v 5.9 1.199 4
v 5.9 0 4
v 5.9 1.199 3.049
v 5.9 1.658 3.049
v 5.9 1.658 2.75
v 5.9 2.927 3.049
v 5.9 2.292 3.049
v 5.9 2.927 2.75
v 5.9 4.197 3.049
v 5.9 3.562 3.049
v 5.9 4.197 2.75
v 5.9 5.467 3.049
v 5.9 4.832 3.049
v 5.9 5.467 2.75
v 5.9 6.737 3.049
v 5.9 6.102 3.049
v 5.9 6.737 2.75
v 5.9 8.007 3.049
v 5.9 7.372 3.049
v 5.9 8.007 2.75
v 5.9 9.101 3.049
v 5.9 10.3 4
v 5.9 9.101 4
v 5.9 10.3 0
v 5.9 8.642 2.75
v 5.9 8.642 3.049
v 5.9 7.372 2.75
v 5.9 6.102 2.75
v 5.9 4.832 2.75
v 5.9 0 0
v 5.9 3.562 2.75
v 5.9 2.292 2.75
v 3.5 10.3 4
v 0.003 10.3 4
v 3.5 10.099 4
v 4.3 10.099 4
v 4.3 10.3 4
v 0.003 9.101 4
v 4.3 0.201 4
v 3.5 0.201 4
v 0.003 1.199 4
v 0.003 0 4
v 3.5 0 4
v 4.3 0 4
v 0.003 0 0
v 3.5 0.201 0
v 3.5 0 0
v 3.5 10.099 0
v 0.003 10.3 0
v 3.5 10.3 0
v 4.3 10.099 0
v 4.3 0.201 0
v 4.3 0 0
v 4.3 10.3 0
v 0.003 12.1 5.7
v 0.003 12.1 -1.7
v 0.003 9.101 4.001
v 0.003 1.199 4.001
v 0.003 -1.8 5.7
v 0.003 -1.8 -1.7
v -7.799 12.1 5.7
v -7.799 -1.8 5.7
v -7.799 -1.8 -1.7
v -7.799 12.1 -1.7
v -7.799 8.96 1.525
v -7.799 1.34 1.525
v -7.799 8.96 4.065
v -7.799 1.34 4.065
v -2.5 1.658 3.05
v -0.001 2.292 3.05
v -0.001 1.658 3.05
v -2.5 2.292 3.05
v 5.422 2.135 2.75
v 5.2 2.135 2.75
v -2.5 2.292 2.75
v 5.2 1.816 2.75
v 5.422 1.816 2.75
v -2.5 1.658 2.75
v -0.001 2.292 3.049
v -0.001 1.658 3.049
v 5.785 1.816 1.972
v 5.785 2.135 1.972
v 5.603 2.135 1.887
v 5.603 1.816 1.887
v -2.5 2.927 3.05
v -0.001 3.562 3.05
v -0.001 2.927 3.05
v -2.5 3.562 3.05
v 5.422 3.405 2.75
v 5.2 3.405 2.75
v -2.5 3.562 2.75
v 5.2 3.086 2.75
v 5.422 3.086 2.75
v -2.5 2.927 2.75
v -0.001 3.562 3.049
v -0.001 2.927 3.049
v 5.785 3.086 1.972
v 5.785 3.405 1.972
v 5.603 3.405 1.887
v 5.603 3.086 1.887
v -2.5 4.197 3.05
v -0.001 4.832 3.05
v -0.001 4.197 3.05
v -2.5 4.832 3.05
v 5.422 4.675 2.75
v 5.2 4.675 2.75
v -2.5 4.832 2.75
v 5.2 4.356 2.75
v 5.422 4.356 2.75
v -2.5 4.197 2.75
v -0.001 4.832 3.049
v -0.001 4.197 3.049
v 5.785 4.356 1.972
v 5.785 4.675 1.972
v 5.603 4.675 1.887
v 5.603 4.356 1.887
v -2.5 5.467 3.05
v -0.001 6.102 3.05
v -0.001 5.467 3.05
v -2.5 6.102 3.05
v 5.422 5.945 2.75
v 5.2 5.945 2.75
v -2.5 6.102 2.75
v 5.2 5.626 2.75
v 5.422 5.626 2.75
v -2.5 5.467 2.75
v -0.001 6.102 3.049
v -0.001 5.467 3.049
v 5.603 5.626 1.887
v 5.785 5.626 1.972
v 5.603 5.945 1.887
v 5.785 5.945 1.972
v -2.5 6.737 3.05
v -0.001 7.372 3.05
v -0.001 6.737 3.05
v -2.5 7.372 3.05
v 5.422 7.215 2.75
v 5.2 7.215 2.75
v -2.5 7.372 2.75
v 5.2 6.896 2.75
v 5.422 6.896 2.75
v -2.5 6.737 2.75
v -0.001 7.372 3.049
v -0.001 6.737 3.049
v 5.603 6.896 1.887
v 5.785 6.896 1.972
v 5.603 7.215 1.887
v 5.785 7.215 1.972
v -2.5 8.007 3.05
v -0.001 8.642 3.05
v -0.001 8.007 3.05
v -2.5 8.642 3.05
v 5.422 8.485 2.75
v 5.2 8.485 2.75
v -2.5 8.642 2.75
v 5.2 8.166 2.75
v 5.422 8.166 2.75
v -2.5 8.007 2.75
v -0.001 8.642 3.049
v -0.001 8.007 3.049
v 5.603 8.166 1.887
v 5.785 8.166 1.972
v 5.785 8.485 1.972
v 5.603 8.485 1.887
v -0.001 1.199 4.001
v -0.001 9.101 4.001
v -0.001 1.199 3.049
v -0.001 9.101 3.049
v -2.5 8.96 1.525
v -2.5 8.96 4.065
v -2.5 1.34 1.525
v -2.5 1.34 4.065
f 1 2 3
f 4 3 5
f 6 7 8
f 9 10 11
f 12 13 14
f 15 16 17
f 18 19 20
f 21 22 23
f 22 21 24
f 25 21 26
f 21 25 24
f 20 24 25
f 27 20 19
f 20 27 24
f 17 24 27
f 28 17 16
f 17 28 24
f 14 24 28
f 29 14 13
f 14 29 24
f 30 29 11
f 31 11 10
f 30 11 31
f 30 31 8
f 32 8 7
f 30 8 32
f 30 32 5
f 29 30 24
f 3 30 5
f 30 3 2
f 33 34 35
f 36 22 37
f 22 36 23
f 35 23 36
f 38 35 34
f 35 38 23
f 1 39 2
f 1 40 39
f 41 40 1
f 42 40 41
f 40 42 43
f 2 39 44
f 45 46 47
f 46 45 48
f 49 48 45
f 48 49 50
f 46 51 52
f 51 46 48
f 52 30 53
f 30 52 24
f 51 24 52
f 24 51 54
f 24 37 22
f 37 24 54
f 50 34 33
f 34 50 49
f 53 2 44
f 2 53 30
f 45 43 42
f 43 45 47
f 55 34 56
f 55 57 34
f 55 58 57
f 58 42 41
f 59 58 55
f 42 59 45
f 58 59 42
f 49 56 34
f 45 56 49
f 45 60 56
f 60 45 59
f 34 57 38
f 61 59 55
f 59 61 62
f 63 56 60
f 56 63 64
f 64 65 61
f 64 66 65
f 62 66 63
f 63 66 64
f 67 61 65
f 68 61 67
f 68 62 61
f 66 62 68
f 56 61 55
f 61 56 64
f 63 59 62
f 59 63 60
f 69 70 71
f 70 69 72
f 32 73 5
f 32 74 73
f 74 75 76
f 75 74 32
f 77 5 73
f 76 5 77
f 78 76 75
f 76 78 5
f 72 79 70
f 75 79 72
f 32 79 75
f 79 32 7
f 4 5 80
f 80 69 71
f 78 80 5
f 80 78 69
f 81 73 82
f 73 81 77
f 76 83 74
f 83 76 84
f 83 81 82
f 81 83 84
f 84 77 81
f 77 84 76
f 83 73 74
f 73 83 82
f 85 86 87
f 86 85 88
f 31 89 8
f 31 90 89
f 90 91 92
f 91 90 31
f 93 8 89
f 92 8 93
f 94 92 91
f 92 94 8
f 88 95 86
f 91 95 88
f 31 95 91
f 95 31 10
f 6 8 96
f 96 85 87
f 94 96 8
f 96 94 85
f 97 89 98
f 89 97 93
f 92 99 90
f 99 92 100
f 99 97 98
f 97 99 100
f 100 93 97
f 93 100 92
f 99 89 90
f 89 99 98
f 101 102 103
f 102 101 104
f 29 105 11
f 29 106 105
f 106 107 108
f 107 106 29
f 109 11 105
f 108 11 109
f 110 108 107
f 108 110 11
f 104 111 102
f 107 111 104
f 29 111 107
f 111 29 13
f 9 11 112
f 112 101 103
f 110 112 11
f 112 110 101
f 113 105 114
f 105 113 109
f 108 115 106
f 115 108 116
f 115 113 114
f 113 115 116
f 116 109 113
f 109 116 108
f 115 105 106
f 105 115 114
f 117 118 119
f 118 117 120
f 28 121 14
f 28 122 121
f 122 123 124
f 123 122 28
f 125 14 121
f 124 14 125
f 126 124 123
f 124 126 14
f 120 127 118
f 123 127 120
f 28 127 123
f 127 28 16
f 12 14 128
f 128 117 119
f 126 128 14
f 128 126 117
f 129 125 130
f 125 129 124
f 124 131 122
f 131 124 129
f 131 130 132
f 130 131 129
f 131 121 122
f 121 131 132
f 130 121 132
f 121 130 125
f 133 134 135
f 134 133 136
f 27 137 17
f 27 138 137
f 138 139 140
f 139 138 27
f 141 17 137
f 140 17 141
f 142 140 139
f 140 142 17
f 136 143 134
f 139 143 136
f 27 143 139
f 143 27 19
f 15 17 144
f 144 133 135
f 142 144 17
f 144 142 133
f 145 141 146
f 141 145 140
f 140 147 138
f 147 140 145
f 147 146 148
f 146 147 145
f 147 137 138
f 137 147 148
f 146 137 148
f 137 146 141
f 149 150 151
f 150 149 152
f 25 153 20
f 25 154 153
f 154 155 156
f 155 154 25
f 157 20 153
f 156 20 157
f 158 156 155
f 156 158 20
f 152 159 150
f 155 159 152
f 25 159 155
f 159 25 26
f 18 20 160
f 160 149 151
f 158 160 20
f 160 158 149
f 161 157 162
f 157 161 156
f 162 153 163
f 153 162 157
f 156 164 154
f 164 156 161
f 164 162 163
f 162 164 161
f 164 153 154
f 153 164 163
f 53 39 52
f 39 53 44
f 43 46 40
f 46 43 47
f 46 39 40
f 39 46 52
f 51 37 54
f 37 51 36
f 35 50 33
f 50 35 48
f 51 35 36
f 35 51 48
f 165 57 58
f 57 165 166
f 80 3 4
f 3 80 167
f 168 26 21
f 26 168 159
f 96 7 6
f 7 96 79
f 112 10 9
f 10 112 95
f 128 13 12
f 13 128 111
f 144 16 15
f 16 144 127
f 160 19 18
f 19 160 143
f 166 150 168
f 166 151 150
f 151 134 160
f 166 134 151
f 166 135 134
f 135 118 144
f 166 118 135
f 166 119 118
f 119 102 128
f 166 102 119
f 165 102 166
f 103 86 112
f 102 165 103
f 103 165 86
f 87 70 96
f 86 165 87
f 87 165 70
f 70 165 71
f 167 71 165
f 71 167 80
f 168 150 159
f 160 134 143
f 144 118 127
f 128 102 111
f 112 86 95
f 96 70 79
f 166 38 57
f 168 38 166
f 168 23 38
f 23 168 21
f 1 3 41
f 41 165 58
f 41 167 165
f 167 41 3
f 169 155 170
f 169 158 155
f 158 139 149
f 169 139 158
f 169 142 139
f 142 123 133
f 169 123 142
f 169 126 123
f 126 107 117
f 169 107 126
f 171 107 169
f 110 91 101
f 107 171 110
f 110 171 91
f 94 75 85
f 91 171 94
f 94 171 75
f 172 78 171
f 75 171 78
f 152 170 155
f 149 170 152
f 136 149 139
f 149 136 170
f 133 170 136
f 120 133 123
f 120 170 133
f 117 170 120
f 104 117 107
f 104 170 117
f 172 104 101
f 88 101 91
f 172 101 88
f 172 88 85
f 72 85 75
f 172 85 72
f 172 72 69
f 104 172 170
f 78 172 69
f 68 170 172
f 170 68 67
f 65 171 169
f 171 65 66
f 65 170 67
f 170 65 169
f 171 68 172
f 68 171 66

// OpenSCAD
/*
 * Attempt to design Powered Up-compatible power/data connector.
 */
 
 // Contact area
 // Critical dimensions to fit the socket are:
 //
 // Edge guides: fit in slot 1mm high, 1.2mm wide
 //
 // Contact area: 3.3mm high, 7.90 wide (not inc edge guides)
 //
 // Total plug width 10.4 (7.9 + 1.2*2)
 //
 // Total plug height max 4.3 (1.0 + 3.3)
 //
 // Total plug contact area depth something appx 5.65..5.90
 //
 // Connector pitch is same as standard SATA cable: 1.27mm i.e 0.05in, or 1/2 the "standard" 2.54 or 0.10 inch pitch. Pin width is half the "standard" 0.635 mm or 0.025in, at 0.3175mm or 0.0125in.
 //
 // Note plug has some alignment features too. Small insets on sides for protrusions in socket to engage with. Small bump on end of contact area to align contacts by engaging with deepest part of socket.

contact_holder_contacts_width = 7.9;
contact_holder_edge_guide_width = 1.2;
// Therefore total width of plug is approx 10.25 or 10.30
contact_holder_total_width = contact_holder_contacts_width + contact_holder_edge_guide_width*2;

// This should add up to the contact holder thickness of 4.0mm.
// Some adjustment will be required.
contact_holder_edge_guide_height = 0.95;
contact_holder_contact_inset_height = 0.30;
contact_holder_base_height = 2.75;

contact_holder_total_height = contact_holder_edge_guide_height + contact_holder_contact_inset_height + contact_holder_base_height;

// Standard pitch, same as SATA. Separation varies with contact width, this is for flat trace style contacts. The contacts should be centered and evenly spaced. Contact height can vary a bit by the looks, the contacts are sprung on the socket end.
contact_count = 6;
contact_pitch = 1.27;
contact_width = 0.3175;
contact_height = 0.2;
contact_inset_width = contact_pitch/2;
// How far the contact grooves should extend into the handle part
contact_inset_extra_length = 2.5;

// notch placement for where contacts should slot into plug - distance from end
contact_termination_hole_length_inset = 0.5;
contact_termination_hole_length = contact_width*3;

contact_holder_length = 5.90;

// Less dimensoinally critical, the handle part
handle_length = 7.8;
handle_width = 13.9;
handle_height = 7.4;

// cable-hole area in handle
handle_cable_hole_width = contact_pitch*6;
handle_cable_hole_height = contact_pitch*2;

// side-grip notches in sides of plug
side_notch_xoff = 3.5;
side_notch_x = 0.8;
side_notch_y = 0.2;

s = 0.001;

// Plug part
difference()
{
    union() {
        
        // Main contact area chunk
        cube([
            contact_holder_length,
            contact_holder_total_width,
            contact_holder_total_height
            ]);
            
        // The holder part. Dimensions aren't so critical, but might as well
        // match the original.
        translate([
            -handle_length +s,
            -(handle_width - contact_holder_total_width)/2,
            -(handle_height - contact_holder_total_height)/2
        ])
        difference()
        {
            cube([
                handle_length+2*s,
                handle_width,
                handle_height
            ]);
        }
    }

    // Cut the way between the contacts on the contact area, removing the edge-guide part.
    translate([
        -s,
        -s + contact_holder_edge_guide_width,
        -s + contact_holder_base_height + contact_holder_contact_inset_height
    ])
    cube([
        contact_holder_length + 2*s,
        contact_holder_contacts_width + 2*s,
        contact_holder_edge_guide_height + 2*s
        ]);
    
    // In the main contacts area, cut inset grooves for the contacts to ride in. These can be customised. They deliberately extend into the handle-part.
    let(contact_edge_inset = (contact_holder_contacts_width - (6*contact_pitch))/2)
    translate([0, contact_holder_edge_guide_width + contact_edge_inset, 0])
    {
        // Main contacts area
        for (c = [1 : 6]) {
            // Pitch is the critical factor in contact placement.  At a pitch of 1.27mm, the width is 7.62mm. The measured 7.9 is because there are lips on the edges. Place contacts from center out. This is the cutouts.
            translate([0, (contact_pitch - contact_inset_width)/2, 0])
            {
                translate([
                    -s - contact_inset_extra_length,
                    (c-1)*contact_pitch
                    ,contact_holder_base_height
                ])
                cube([
                    contact_holder_length + contact_inset_extra_length+s*2,
                    contact_inset_width,
                    contact_holder_contact_inset_height
                    ]);
                
                // Cut notches for the contacts to slot into to hold
                // them in place. These go near the end of the plug. Sloped for easy insertion.
                
                translate([
                    contact_holder_length - contact_termination_hole_length_inset - contact_height,
                    (c-1)*contact_pitch,
                    contact_holder_base_height
                ])
                rotate([0,-25,0])
                translate([
                    0,
                    (contact_pitch/2 - contact_width)/2,
                    -contact_termination_hole_length
                ])
                cube([
                    contact_height+s,
                    contact_width+s,
                    contact_termination_hole_length
                ]);
            }
        }
    }
    
    // Cut out the cable space in the plug connector.
    translate([
        -s - handle_length,
        abs(handle_cable_hole_width-contact_holder_total_width)/2,
        (contact_holder_base_height+contact_holder_contact_inset_height)/2
    ])
    cube([
        handle_length - contact_inset_extra_length + s,
        handle_cable_hole_width,
        handle_cable_hole_height
    ]);
    
    // Cut out the notches for the side grips to engage.
    for (i = [0,1])
    translate([
        side_notch_xoff,
        -s + i*(contact_holder_total_width-side_notch_y),
        -s
    ])
    cube([
        side_notch_x,
        side_notch_y+2*s,
        contact_holder_total_height+2*s
    ]);
        
};


// Model the contacts too. Place them from center out.
if ($preview)
color("red", 0.5)
translate([
    -handle_length,
    contact_holder_total_width/2,
    contact_holder_base_height
])
for (c = [1:6]) {
    let(coff = (c-3.5)*contact_pitch - contact_width/2)
    translate([0, coff , 0])
    cube([
        contact_holder_length+handle_length,
        contact_width,
        contact_height
    ]);
}
